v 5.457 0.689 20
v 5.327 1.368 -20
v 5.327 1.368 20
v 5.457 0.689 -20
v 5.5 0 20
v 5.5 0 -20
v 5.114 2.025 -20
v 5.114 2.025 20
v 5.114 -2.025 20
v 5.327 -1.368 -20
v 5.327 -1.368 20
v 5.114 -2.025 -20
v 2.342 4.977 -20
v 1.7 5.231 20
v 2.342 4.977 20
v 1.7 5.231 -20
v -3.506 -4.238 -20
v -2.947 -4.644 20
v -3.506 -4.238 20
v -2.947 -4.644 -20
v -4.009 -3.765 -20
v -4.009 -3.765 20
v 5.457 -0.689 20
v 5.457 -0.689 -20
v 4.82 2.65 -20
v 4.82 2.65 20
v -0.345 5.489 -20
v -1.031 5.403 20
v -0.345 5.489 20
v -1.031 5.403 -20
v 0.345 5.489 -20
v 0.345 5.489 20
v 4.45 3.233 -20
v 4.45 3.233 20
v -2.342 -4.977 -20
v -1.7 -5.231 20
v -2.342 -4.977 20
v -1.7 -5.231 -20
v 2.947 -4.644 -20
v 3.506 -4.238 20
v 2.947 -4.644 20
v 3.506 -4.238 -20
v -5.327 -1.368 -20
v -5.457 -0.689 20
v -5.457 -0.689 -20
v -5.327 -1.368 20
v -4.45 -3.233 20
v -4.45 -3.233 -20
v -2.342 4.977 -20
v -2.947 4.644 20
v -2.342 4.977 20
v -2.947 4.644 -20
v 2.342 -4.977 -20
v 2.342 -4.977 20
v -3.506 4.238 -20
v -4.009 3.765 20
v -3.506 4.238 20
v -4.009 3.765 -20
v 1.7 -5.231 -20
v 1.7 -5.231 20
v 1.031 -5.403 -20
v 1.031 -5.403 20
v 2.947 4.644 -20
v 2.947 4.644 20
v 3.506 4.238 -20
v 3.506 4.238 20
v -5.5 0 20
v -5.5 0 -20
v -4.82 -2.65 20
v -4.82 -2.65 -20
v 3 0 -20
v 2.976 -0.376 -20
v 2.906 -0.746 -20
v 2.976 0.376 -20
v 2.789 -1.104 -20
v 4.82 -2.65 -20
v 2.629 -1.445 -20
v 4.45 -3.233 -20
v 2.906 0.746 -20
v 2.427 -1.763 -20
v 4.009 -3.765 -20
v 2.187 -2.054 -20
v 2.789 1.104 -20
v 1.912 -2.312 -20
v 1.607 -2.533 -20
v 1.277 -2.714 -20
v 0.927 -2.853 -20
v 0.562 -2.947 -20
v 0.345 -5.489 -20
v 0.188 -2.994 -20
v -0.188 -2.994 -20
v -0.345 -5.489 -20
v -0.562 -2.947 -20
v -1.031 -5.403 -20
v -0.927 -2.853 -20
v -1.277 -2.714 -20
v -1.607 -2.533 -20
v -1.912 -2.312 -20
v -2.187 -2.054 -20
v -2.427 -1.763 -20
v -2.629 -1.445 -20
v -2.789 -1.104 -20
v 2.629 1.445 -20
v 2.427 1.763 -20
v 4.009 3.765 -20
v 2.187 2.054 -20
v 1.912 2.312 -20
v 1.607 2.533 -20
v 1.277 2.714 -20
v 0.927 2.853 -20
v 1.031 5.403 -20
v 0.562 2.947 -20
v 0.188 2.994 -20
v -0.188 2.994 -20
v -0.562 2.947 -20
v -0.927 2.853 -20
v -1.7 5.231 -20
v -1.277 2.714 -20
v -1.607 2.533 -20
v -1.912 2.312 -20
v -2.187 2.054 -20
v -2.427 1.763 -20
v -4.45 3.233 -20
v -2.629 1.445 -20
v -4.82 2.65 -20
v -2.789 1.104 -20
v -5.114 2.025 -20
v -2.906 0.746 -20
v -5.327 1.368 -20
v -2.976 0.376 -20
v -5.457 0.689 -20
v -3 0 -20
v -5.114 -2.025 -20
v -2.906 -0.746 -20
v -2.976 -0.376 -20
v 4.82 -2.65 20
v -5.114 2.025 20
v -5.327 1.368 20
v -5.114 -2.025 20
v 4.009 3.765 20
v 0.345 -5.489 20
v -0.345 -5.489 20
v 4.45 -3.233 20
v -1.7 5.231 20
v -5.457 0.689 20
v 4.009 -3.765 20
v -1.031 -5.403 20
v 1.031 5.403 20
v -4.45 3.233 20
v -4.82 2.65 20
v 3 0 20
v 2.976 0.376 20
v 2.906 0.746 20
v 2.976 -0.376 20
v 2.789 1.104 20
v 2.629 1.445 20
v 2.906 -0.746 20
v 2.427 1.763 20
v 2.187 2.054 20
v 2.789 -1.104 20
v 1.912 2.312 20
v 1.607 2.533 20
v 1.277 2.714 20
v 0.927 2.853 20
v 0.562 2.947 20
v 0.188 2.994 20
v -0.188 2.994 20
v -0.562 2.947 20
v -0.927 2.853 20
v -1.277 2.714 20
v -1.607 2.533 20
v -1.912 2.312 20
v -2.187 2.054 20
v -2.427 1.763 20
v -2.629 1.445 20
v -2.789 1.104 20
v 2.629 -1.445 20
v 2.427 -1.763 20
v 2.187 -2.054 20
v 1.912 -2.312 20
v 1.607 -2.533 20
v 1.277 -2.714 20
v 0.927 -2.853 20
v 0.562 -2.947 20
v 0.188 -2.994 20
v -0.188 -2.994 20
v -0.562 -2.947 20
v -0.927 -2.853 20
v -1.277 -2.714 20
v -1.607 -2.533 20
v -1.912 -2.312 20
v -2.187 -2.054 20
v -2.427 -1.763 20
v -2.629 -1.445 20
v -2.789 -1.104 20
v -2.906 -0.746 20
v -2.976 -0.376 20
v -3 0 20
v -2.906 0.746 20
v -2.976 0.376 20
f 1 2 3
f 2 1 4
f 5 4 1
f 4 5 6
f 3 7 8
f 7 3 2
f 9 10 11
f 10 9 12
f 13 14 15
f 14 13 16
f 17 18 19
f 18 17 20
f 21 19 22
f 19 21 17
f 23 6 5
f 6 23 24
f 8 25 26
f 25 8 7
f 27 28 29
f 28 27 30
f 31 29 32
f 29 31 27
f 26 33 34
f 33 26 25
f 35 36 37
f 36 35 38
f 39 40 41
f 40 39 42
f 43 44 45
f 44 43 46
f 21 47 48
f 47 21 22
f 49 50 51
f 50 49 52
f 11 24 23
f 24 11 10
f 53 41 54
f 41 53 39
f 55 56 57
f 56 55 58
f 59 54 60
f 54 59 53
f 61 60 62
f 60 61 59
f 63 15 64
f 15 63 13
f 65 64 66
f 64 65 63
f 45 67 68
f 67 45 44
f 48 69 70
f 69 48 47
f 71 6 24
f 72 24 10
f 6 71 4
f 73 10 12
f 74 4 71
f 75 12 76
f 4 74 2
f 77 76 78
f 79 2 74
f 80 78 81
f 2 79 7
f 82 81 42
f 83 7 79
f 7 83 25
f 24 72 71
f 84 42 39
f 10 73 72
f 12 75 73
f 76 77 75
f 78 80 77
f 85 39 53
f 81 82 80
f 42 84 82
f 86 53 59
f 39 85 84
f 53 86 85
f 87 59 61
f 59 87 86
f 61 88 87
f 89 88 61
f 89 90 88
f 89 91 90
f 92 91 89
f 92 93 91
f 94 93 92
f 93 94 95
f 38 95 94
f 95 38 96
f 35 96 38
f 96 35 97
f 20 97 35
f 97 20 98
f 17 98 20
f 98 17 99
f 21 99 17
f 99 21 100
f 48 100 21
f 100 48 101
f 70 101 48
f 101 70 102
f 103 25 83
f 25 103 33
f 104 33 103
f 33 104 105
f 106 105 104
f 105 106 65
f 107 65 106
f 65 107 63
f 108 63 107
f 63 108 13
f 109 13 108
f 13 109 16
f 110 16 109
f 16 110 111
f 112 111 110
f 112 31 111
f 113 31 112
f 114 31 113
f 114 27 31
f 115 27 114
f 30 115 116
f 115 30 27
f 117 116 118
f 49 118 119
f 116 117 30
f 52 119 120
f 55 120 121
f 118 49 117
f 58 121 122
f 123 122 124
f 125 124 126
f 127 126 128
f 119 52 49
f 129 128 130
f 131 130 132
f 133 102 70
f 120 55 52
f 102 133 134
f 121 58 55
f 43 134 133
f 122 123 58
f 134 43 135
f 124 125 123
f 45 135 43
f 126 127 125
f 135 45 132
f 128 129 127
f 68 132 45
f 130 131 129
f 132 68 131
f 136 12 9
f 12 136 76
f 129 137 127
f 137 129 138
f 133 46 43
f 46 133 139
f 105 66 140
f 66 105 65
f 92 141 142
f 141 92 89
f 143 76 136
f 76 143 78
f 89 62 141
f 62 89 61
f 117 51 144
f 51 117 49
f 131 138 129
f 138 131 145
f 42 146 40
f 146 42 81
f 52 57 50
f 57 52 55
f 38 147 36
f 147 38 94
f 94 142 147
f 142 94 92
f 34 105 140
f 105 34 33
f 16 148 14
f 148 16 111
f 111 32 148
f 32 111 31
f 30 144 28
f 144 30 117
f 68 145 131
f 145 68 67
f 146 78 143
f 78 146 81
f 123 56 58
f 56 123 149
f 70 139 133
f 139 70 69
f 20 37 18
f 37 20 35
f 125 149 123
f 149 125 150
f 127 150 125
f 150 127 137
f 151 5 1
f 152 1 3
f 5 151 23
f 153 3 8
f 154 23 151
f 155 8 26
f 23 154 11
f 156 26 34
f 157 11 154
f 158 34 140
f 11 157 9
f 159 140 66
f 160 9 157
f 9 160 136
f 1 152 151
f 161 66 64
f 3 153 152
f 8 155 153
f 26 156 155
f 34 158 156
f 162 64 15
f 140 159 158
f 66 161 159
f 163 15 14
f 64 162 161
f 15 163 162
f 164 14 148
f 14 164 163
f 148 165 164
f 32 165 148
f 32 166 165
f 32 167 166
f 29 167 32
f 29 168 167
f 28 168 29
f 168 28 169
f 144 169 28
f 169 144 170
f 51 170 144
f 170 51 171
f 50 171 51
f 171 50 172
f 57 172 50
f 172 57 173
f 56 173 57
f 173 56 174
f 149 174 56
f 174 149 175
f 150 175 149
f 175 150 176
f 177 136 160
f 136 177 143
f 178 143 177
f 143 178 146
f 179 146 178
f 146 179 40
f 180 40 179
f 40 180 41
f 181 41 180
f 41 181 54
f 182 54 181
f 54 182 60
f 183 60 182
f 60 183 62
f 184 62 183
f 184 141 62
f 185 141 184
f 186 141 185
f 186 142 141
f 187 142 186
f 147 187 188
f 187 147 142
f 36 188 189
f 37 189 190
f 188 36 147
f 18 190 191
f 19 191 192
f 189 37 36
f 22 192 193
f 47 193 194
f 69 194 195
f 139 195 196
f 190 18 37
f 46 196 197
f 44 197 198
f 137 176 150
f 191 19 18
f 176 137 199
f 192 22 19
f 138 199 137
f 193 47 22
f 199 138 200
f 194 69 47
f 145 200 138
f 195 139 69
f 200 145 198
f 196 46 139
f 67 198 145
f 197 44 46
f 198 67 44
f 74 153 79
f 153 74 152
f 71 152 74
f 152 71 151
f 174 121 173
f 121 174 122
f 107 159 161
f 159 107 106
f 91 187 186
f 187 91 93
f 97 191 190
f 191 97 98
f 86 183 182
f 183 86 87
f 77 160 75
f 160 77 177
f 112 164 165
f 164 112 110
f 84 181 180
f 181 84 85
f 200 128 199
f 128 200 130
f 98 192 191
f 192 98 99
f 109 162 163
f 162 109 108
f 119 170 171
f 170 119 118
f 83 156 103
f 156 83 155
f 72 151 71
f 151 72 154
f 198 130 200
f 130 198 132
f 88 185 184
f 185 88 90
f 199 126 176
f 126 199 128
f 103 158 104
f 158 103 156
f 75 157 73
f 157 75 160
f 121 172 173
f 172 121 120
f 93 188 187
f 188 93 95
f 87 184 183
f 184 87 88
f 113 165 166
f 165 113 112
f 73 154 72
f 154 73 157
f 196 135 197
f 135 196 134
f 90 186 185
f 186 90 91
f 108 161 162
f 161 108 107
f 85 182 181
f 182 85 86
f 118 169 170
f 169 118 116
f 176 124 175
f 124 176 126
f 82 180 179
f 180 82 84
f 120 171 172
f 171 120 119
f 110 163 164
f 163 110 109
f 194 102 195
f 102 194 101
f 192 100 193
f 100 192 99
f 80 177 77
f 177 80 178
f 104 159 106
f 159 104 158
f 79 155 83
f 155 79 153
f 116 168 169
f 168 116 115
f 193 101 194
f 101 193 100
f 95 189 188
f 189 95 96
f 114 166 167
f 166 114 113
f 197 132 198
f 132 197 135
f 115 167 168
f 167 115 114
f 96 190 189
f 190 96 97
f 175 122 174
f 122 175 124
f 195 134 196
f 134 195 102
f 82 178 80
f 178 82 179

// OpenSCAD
$fn = 50;


difference() {
	union() {
		translate(v = [0, 0, -20.0000000000]) {
			cylinder(h = 40, r = 5.5000000000);
		}
	}
	union() {
		translate(v = [0, 0, -100.0000000000]) {
			cylinder(h = 200, r = 3.0000000000);
		}
	}
}
